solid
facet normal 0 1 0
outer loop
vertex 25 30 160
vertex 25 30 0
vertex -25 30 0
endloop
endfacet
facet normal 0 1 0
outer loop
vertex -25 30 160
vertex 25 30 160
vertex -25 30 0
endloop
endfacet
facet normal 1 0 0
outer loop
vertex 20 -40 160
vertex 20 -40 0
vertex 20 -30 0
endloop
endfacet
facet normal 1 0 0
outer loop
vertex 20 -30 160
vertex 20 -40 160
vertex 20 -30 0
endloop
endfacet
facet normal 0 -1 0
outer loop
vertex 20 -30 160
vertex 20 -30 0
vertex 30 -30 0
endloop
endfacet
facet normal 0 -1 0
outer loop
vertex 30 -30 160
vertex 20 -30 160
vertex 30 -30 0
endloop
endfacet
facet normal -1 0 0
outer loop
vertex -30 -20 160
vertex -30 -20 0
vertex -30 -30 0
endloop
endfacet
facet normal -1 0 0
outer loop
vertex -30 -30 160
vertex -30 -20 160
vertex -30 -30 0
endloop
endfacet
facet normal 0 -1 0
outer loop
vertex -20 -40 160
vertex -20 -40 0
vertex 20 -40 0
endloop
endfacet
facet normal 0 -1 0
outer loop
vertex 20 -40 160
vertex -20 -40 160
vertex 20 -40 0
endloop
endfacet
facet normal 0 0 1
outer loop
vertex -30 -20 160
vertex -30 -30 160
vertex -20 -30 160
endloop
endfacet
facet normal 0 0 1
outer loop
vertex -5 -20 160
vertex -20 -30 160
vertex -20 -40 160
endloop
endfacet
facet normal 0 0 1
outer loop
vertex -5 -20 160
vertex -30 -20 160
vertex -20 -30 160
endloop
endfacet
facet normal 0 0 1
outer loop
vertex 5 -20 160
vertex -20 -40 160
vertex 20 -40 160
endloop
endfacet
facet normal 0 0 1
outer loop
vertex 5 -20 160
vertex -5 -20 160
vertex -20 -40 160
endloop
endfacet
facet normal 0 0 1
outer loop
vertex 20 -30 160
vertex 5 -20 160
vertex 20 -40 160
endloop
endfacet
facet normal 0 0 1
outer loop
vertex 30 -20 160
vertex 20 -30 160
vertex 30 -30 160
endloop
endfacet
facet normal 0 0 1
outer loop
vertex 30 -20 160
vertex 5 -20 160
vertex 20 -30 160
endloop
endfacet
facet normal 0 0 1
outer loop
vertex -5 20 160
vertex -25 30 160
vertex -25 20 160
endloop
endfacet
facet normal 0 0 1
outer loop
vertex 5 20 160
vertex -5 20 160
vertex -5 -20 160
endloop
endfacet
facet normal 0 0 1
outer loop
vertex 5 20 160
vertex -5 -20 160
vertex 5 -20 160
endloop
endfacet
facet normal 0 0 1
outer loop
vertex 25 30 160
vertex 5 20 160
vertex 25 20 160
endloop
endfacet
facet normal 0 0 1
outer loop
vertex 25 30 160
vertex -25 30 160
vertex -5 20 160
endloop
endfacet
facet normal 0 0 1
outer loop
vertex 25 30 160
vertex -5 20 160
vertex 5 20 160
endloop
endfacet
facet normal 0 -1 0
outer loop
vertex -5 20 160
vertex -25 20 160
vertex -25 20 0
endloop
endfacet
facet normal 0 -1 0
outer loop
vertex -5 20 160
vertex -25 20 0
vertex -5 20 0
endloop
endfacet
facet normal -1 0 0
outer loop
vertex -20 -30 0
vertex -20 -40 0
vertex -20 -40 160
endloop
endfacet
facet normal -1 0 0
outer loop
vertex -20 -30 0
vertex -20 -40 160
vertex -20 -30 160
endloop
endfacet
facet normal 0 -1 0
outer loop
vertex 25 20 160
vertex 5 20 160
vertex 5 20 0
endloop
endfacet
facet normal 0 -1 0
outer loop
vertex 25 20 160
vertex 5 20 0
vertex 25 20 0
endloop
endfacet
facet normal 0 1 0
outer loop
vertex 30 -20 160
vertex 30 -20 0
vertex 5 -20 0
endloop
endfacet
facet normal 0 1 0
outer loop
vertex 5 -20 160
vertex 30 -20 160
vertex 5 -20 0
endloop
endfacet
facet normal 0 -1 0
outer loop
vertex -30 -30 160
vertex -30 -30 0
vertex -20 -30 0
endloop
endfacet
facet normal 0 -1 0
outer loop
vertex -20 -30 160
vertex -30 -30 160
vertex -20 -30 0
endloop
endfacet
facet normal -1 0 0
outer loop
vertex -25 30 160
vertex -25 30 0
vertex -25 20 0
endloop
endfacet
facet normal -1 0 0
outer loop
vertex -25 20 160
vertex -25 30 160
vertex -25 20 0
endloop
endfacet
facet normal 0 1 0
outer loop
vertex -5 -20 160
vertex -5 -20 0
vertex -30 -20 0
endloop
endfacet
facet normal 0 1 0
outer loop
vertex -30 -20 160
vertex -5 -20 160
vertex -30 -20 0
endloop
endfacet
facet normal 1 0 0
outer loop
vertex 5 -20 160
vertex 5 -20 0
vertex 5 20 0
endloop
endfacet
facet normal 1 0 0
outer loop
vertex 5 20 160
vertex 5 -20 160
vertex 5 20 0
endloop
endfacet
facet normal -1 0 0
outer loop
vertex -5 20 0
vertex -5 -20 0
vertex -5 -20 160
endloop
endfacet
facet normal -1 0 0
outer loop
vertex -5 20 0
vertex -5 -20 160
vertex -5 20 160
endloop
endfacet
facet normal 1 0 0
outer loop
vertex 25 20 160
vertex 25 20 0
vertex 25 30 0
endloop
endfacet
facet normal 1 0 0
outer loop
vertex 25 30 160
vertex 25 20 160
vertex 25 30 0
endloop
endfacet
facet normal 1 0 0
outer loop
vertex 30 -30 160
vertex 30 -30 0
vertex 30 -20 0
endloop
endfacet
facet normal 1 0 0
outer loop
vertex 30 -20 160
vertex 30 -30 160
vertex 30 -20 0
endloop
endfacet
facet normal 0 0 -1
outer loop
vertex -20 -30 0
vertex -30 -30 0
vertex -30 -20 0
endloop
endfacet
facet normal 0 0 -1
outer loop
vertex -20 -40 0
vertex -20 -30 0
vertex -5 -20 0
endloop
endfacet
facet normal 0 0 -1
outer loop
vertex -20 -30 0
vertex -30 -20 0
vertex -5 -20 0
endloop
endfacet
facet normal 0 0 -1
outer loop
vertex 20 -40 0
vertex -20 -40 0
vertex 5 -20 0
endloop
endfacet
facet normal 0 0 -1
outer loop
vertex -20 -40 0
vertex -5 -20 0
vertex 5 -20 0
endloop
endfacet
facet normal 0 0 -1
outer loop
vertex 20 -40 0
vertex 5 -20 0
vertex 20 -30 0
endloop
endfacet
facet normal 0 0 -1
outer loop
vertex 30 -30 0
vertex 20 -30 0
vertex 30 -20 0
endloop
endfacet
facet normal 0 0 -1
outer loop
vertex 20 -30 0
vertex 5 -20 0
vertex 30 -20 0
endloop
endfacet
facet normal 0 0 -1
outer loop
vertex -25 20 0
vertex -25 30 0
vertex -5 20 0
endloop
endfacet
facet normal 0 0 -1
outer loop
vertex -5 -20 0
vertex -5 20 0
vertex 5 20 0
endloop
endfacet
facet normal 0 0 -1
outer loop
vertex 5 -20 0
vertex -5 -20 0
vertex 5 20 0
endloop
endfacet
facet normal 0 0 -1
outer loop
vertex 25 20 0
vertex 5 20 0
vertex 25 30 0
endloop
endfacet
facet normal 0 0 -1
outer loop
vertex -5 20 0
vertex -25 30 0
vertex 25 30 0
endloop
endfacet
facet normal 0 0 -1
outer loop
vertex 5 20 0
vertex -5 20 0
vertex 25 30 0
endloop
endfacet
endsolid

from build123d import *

# Parameters (mm, degrees)
EXTRUDE_1_DEPTH = 160


with BuildPart() as part:
    # Эскиз1 → Бобышка-Вытянуть1 (new body)
    with BuildSketch(Plane.XY):
        Polygon((-5, 20), (-5, -20), (-30, -20), (-30, -30), (-20, -30), (-20, -40), (20, -40), (20, -30), (30, -30), (30, -20), (5, -20), (5, 20), (25, 20), (25, 30), (-25, 30), (-25, 20), align=None)
    extrude(amount=EXTRUDE_1_DEPTH)


solid = part.part
